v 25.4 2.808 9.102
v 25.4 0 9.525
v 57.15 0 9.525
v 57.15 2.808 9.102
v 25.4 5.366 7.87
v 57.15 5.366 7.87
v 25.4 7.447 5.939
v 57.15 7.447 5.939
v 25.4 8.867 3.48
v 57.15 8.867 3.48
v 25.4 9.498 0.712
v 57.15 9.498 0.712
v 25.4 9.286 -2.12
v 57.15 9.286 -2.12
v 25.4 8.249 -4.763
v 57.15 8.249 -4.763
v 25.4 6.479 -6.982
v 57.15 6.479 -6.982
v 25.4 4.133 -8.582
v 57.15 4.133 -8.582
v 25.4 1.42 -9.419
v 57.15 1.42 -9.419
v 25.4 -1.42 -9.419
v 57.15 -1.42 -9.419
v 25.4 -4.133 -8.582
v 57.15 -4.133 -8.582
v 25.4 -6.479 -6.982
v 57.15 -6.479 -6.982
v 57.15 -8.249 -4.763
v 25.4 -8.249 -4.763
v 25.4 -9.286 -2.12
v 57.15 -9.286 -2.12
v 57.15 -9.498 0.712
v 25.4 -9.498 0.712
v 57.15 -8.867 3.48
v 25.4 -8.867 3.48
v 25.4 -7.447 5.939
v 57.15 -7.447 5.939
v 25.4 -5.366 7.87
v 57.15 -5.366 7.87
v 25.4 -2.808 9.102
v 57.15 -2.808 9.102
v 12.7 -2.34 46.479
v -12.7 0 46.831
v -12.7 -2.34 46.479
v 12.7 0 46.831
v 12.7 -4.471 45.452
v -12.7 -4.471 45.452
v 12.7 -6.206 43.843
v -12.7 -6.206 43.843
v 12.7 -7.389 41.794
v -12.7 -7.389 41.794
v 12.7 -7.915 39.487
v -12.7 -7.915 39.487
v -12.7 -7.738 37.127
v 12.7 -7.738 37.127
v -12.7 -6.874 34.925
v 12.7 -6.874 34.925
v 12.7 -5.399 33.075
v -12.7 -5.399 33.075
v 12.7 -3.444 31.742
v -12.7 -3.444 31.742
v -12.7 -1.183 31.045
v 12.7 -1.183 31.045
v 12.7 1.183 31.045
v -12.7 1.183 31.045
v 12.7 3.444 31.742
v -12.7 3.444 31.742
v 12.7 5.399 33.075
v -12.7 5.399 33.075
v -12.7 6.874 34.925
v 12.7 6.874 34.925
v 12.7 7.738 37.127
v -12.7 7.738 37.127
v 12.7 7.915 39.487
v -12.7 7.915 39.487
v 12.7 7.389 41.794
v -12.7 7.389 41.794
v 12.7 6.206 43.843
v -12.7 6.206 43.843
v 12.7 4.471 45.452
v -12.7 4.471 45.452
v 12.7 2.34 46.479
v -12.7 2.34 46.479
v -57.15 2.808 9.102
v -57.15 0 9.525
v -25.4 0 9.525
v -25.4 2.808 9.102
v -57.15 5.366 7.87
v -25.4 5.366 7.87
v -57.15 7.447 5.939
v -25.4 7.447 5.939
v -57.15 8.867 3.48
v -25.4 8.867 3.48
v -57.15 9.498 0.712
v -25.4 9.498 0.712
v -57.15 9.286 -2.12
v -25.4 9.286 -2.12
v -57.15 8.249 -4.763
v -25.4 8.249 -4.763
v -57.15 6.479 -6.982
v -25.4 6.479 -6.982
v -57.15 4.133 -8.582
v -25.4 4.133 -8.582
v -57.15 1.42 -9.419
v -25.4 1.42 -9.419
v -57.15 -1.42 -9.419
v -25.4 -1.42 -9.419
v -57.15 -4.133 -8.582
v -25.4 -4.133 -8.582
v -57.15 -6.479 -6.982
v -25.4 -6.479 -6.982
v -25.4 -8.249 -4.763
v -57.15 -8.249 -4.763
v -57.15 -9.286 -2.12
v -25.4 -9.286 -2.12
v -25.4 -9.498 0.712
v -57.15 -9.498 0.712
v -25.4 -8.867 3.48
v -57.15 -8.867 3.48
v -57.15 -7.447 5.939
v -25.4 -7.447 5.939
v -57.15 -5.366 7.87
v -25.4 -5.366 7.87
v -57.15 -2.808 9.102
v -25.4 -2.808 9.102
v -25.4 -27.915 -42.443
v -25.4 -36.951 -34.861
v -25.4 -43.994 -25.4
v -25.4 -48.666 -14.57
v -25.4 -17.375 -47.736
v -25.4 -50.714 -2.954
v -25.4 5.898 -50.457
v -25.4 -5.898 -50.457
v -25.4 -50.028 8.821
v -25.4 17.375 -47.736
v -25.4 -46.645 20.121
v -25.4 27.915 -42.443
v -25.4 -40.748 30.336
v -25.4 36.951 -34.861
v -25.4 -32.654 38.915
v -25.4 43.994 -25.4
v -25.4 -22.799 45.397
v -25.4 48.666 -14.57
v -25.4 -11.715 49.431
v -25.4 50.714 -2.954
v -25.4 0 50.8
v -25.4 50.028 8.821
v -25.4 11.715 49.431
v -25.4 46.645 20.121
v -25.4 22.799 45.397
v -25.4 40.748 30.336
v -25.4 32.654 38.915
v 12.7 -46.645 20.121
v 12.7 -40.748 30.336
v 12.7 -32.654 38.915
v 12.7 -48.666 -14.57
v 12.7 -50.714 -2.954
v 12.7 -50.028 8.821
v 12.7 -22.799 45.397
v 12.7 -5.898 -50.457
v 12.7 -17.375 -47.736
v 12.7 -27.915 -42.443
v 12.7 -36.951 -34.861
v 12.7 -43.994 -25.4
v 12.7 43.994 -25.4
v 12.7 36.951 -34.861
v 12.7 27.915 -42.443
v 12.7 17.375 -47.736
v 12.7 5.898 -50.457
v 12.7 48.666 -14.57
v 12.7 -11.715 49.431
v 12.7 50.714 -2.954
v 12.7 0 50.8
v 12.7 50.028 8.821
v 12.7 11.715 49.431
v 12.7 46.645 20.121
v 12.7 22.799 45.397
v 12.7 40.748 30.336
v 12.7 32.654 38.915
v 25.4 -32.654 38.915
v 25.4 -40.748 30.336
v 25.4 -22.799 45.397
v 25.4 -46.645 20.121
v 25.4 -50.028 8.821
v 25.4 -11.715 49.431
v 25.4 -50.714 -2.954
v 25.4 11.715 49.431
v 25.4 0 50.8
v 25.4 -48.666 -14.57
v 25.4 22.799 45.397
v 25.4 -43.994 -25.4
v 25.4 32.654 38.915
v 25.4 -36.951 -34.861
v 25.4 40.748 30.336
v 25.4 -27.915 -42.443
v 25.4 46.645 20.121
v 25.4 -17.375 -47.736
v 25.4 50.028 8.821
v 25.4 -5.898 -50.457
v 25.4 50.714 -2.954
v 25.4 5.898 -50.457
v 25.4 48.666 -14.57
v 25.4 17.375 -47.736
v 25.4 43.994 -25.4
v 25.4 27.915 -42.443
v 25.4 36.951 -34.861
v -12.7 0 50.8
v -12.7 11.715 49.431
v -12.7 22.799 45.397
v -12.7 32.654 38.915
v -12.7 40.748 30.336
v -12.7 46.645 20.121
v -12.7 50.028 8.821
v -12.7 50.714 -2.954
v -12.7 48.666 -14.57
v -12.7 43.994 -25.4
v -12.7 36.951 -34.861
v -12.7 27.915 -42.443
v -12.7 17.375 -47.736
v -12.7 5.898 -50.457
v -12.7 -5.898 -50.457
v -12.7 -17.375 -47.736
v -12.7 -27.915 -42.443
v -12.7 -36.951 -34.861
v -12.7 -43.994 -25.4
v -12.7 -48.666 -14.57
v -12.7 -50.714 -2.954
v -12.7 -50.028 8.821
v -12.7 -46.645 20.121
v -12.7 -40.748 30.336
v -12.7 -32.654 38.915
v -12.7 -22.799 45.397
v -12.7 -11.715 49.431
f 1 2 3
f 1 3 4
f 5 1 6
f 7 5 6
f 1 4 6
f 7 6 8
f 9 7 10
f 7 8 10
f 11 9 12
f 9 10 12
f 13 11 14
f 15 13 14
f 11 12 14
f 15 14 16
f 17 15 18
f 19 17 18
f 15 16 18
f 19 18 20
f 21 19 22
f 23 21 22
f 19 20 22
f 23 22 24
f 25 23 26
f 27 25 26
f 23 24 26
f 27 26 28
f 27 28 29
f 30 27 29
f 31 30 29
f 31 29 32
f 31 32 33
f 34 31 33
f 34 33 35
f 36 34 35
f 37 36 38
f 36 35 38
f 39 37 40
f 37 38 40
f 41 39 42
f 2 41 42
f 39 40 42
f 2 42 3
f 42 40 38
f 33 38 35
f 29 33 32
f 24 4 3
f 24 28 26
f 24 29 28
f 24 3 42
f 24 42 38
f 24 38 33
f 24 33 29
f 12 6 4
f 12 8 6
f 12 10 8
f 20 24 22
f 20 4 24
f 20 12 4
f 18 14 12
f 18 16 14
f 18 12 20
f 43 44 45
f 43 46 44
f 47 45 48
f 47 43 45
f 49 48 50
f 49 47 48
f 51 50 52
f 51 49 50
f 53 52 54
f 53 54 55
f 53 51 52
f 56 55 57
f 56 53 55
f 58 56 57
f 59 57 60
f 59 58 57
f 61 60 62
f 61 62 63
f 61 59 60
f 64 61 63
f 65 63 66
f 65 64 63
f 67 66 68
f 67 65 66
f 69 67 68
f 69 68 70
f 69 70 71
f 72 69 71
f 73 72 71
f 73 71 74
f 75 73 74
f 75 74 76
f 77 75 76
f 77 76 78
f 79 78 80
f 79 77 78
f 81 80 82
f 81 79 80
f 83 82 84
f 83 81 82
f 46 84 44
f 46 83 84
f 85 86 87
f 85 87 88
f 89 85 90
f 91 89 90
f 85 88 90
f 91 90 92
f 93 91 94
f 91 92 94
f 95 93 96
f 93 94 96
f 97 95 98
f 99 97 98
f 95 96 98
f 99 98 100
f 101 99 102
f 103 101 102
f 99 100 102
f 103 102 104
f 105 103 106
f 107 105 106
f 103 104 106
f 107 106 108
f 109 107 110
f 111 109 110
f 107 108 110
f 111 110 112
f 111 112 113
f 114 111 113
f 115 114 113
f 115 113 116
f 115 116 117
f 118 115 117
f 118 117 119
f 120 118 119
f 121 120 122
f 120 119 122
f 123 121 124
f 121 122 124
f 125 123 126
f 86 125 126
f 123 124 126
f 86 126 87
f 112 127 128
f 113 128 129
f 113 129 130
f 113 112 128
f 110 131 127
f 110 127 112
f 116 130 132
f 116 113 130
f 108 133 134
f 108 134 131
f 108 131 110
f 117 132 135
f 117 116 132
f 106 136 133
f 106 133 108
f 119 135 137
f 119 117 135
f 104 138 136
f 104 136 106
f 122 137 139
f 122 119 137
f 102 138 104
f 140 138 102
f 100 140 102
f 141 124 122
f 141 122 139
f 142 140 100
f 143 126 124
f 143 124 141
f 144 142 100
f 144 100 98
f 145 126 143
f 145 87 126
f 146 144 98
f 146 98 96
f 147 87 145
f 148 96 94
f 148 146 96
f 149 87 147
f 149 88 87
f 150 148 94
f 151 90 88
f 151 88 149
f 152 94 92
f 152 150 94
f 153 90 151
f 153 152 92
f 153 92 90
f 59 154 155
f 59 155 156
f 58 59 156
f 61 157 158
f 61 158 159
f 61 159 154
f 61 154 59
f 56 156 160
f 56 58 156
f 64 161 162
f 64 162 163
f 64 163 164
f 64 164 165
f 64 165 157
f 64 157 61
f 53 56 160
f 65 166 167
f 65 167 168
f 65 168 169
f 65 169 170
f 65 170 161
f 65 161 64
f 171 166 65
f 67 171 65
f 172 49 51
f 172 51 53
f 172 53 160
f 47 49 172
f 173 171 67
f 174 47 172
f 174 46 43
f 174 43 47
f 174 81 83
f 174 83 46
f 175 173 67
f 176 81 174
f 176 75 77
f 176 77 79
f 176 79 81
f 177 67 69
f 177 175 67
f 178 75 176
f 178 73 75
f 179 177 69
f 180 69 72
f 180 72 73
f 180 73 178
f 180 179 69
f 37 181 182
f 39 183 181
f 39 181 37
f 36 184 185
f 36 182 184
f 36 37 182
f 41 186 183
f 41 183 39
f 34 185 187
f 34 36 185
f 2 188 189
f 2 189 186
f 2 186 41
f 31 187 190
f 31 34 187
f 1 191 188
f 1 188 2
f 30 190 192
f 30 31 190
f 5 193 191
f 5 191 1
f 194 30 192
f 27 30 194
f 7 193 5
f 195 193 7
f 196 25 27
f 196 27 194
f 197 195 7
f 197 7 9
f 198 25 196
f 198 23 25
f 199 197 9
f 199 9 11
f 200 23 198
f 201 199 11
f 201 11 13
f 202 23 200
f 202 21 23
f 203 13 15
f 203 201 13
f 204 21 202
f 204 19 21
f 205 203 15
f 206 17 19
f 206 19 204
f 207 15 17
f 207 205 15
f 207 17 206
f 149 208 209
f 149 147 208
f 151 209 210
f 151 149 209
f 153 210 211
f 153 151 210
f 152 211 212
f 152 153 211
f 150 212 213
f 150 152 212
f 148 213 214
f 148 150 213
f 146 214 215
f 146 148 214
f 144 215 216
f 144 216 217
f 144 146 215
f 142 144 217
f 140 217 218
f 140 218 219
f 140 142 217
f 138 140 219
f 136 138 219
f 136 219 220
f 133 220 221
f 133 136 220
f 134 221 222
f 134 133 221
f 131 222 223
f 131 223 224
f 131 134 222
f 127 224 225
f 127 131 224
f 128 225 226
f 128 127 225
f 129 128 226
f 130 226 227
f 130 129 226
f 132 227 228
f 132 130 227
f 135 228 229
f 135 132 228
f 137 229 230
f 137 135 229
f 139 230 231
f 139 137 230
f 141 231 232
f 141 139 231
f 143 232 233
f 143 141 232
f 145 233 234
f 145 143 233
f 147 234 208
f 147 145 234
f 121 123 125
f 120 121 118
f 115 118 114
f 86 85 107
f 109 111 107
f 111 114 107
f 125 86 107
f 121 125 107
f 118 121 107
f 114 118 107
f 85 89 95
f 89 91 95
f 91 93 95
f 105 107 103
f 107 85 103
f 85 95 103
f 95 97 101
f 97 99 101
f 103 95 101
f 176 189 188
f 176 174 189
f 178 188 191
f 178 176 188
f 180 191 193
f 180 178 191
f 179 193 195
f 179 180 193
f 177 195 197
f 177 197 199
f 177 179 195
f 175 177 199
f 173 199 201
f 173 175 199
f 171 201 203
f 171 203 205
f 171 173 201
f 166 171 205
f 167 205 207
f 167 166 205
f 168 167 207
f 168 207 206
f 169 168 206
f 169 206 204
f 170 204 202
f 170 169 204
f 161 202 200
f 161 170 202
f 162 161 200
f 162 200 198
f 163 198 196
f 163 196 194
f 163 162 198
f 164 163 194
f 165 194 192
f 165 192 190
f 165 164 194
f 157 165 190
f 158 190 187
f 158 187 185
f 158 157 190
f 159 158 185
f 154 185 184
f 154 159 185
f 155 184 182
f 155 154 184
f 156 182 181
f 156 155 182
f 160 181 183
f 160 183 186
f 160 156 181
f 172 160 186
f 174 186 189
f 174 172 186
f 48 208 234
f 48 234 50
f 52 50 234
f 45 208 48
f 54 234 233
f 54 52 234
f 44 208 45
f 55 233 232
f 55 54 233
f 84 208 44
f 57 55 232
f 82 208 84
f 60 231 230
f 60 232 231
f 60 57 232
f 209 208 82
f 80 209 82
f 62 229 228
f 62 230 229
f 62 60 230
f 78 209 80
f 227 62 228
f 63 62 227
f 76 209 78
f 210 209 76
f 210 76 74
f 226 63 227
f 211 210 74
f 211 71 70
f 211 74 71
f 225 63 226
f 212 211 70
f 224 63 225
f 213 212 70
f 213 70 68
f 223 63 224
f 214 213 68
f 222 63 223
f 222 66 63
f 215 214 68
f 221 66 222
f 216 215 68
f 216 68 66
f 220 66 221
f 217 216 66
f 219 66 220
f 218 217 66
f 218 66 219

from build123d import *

# Parameters (mm, degrees)
F0_W = 31.75
F0_H = 9.525
F2_W = 25.4
F2_H = 7.9375


with BuildPart() as f1:
    # F0 (on Front) → F1 (revolve)
    with BuildSketch(Plane.XZ):
        with Locations((-41.275, 4.7625)):
            Rectangle(F0_W, F0_H)
        Polygon((-25.4, 9.525), (-25.4, 0), (-12.7, 0), (-12.7, 38.89375), (-12.7, 46.83125), (-12.7, 50.8), (-25.4, 50.8), align=None)
    revolve(axis=Axis((-41.275, 0, 0), (-1, 0, 0)))



with BuildPart() as f1b:
    # F0 (on Front) → F1, piece 2 (revolve)
    with BuildSketch(Plane.XZ):
        Polygon((12.7, 46.83125), (12.7, 38.89375), (12.7, 0), (25.4, 0), (25.4, 9.525), (25.4, 50.8), (12.7, 50.8), align=None)
        with Locations((41.275, 4.7625)):
            Rectangle(F0_W, F0_H)
    revolve(axis=Axis((-41.275, 0, 0), (-1, 0, 0)))


with BuildPart() as f1_1:
    add(f1.part)

    add(f1b.part)  # F3 merges F1b
    # F2 (on Front) → F3 (revolve)
    with BuildSketch(Plane.XZ):
        with Locations((0, 42.8625)):
            Rectangle(F2_W, F2_H)
    revolve(axis=Axis((0, 0, 38.89375), (1, 0, 0)))


solid = f1_1.part
